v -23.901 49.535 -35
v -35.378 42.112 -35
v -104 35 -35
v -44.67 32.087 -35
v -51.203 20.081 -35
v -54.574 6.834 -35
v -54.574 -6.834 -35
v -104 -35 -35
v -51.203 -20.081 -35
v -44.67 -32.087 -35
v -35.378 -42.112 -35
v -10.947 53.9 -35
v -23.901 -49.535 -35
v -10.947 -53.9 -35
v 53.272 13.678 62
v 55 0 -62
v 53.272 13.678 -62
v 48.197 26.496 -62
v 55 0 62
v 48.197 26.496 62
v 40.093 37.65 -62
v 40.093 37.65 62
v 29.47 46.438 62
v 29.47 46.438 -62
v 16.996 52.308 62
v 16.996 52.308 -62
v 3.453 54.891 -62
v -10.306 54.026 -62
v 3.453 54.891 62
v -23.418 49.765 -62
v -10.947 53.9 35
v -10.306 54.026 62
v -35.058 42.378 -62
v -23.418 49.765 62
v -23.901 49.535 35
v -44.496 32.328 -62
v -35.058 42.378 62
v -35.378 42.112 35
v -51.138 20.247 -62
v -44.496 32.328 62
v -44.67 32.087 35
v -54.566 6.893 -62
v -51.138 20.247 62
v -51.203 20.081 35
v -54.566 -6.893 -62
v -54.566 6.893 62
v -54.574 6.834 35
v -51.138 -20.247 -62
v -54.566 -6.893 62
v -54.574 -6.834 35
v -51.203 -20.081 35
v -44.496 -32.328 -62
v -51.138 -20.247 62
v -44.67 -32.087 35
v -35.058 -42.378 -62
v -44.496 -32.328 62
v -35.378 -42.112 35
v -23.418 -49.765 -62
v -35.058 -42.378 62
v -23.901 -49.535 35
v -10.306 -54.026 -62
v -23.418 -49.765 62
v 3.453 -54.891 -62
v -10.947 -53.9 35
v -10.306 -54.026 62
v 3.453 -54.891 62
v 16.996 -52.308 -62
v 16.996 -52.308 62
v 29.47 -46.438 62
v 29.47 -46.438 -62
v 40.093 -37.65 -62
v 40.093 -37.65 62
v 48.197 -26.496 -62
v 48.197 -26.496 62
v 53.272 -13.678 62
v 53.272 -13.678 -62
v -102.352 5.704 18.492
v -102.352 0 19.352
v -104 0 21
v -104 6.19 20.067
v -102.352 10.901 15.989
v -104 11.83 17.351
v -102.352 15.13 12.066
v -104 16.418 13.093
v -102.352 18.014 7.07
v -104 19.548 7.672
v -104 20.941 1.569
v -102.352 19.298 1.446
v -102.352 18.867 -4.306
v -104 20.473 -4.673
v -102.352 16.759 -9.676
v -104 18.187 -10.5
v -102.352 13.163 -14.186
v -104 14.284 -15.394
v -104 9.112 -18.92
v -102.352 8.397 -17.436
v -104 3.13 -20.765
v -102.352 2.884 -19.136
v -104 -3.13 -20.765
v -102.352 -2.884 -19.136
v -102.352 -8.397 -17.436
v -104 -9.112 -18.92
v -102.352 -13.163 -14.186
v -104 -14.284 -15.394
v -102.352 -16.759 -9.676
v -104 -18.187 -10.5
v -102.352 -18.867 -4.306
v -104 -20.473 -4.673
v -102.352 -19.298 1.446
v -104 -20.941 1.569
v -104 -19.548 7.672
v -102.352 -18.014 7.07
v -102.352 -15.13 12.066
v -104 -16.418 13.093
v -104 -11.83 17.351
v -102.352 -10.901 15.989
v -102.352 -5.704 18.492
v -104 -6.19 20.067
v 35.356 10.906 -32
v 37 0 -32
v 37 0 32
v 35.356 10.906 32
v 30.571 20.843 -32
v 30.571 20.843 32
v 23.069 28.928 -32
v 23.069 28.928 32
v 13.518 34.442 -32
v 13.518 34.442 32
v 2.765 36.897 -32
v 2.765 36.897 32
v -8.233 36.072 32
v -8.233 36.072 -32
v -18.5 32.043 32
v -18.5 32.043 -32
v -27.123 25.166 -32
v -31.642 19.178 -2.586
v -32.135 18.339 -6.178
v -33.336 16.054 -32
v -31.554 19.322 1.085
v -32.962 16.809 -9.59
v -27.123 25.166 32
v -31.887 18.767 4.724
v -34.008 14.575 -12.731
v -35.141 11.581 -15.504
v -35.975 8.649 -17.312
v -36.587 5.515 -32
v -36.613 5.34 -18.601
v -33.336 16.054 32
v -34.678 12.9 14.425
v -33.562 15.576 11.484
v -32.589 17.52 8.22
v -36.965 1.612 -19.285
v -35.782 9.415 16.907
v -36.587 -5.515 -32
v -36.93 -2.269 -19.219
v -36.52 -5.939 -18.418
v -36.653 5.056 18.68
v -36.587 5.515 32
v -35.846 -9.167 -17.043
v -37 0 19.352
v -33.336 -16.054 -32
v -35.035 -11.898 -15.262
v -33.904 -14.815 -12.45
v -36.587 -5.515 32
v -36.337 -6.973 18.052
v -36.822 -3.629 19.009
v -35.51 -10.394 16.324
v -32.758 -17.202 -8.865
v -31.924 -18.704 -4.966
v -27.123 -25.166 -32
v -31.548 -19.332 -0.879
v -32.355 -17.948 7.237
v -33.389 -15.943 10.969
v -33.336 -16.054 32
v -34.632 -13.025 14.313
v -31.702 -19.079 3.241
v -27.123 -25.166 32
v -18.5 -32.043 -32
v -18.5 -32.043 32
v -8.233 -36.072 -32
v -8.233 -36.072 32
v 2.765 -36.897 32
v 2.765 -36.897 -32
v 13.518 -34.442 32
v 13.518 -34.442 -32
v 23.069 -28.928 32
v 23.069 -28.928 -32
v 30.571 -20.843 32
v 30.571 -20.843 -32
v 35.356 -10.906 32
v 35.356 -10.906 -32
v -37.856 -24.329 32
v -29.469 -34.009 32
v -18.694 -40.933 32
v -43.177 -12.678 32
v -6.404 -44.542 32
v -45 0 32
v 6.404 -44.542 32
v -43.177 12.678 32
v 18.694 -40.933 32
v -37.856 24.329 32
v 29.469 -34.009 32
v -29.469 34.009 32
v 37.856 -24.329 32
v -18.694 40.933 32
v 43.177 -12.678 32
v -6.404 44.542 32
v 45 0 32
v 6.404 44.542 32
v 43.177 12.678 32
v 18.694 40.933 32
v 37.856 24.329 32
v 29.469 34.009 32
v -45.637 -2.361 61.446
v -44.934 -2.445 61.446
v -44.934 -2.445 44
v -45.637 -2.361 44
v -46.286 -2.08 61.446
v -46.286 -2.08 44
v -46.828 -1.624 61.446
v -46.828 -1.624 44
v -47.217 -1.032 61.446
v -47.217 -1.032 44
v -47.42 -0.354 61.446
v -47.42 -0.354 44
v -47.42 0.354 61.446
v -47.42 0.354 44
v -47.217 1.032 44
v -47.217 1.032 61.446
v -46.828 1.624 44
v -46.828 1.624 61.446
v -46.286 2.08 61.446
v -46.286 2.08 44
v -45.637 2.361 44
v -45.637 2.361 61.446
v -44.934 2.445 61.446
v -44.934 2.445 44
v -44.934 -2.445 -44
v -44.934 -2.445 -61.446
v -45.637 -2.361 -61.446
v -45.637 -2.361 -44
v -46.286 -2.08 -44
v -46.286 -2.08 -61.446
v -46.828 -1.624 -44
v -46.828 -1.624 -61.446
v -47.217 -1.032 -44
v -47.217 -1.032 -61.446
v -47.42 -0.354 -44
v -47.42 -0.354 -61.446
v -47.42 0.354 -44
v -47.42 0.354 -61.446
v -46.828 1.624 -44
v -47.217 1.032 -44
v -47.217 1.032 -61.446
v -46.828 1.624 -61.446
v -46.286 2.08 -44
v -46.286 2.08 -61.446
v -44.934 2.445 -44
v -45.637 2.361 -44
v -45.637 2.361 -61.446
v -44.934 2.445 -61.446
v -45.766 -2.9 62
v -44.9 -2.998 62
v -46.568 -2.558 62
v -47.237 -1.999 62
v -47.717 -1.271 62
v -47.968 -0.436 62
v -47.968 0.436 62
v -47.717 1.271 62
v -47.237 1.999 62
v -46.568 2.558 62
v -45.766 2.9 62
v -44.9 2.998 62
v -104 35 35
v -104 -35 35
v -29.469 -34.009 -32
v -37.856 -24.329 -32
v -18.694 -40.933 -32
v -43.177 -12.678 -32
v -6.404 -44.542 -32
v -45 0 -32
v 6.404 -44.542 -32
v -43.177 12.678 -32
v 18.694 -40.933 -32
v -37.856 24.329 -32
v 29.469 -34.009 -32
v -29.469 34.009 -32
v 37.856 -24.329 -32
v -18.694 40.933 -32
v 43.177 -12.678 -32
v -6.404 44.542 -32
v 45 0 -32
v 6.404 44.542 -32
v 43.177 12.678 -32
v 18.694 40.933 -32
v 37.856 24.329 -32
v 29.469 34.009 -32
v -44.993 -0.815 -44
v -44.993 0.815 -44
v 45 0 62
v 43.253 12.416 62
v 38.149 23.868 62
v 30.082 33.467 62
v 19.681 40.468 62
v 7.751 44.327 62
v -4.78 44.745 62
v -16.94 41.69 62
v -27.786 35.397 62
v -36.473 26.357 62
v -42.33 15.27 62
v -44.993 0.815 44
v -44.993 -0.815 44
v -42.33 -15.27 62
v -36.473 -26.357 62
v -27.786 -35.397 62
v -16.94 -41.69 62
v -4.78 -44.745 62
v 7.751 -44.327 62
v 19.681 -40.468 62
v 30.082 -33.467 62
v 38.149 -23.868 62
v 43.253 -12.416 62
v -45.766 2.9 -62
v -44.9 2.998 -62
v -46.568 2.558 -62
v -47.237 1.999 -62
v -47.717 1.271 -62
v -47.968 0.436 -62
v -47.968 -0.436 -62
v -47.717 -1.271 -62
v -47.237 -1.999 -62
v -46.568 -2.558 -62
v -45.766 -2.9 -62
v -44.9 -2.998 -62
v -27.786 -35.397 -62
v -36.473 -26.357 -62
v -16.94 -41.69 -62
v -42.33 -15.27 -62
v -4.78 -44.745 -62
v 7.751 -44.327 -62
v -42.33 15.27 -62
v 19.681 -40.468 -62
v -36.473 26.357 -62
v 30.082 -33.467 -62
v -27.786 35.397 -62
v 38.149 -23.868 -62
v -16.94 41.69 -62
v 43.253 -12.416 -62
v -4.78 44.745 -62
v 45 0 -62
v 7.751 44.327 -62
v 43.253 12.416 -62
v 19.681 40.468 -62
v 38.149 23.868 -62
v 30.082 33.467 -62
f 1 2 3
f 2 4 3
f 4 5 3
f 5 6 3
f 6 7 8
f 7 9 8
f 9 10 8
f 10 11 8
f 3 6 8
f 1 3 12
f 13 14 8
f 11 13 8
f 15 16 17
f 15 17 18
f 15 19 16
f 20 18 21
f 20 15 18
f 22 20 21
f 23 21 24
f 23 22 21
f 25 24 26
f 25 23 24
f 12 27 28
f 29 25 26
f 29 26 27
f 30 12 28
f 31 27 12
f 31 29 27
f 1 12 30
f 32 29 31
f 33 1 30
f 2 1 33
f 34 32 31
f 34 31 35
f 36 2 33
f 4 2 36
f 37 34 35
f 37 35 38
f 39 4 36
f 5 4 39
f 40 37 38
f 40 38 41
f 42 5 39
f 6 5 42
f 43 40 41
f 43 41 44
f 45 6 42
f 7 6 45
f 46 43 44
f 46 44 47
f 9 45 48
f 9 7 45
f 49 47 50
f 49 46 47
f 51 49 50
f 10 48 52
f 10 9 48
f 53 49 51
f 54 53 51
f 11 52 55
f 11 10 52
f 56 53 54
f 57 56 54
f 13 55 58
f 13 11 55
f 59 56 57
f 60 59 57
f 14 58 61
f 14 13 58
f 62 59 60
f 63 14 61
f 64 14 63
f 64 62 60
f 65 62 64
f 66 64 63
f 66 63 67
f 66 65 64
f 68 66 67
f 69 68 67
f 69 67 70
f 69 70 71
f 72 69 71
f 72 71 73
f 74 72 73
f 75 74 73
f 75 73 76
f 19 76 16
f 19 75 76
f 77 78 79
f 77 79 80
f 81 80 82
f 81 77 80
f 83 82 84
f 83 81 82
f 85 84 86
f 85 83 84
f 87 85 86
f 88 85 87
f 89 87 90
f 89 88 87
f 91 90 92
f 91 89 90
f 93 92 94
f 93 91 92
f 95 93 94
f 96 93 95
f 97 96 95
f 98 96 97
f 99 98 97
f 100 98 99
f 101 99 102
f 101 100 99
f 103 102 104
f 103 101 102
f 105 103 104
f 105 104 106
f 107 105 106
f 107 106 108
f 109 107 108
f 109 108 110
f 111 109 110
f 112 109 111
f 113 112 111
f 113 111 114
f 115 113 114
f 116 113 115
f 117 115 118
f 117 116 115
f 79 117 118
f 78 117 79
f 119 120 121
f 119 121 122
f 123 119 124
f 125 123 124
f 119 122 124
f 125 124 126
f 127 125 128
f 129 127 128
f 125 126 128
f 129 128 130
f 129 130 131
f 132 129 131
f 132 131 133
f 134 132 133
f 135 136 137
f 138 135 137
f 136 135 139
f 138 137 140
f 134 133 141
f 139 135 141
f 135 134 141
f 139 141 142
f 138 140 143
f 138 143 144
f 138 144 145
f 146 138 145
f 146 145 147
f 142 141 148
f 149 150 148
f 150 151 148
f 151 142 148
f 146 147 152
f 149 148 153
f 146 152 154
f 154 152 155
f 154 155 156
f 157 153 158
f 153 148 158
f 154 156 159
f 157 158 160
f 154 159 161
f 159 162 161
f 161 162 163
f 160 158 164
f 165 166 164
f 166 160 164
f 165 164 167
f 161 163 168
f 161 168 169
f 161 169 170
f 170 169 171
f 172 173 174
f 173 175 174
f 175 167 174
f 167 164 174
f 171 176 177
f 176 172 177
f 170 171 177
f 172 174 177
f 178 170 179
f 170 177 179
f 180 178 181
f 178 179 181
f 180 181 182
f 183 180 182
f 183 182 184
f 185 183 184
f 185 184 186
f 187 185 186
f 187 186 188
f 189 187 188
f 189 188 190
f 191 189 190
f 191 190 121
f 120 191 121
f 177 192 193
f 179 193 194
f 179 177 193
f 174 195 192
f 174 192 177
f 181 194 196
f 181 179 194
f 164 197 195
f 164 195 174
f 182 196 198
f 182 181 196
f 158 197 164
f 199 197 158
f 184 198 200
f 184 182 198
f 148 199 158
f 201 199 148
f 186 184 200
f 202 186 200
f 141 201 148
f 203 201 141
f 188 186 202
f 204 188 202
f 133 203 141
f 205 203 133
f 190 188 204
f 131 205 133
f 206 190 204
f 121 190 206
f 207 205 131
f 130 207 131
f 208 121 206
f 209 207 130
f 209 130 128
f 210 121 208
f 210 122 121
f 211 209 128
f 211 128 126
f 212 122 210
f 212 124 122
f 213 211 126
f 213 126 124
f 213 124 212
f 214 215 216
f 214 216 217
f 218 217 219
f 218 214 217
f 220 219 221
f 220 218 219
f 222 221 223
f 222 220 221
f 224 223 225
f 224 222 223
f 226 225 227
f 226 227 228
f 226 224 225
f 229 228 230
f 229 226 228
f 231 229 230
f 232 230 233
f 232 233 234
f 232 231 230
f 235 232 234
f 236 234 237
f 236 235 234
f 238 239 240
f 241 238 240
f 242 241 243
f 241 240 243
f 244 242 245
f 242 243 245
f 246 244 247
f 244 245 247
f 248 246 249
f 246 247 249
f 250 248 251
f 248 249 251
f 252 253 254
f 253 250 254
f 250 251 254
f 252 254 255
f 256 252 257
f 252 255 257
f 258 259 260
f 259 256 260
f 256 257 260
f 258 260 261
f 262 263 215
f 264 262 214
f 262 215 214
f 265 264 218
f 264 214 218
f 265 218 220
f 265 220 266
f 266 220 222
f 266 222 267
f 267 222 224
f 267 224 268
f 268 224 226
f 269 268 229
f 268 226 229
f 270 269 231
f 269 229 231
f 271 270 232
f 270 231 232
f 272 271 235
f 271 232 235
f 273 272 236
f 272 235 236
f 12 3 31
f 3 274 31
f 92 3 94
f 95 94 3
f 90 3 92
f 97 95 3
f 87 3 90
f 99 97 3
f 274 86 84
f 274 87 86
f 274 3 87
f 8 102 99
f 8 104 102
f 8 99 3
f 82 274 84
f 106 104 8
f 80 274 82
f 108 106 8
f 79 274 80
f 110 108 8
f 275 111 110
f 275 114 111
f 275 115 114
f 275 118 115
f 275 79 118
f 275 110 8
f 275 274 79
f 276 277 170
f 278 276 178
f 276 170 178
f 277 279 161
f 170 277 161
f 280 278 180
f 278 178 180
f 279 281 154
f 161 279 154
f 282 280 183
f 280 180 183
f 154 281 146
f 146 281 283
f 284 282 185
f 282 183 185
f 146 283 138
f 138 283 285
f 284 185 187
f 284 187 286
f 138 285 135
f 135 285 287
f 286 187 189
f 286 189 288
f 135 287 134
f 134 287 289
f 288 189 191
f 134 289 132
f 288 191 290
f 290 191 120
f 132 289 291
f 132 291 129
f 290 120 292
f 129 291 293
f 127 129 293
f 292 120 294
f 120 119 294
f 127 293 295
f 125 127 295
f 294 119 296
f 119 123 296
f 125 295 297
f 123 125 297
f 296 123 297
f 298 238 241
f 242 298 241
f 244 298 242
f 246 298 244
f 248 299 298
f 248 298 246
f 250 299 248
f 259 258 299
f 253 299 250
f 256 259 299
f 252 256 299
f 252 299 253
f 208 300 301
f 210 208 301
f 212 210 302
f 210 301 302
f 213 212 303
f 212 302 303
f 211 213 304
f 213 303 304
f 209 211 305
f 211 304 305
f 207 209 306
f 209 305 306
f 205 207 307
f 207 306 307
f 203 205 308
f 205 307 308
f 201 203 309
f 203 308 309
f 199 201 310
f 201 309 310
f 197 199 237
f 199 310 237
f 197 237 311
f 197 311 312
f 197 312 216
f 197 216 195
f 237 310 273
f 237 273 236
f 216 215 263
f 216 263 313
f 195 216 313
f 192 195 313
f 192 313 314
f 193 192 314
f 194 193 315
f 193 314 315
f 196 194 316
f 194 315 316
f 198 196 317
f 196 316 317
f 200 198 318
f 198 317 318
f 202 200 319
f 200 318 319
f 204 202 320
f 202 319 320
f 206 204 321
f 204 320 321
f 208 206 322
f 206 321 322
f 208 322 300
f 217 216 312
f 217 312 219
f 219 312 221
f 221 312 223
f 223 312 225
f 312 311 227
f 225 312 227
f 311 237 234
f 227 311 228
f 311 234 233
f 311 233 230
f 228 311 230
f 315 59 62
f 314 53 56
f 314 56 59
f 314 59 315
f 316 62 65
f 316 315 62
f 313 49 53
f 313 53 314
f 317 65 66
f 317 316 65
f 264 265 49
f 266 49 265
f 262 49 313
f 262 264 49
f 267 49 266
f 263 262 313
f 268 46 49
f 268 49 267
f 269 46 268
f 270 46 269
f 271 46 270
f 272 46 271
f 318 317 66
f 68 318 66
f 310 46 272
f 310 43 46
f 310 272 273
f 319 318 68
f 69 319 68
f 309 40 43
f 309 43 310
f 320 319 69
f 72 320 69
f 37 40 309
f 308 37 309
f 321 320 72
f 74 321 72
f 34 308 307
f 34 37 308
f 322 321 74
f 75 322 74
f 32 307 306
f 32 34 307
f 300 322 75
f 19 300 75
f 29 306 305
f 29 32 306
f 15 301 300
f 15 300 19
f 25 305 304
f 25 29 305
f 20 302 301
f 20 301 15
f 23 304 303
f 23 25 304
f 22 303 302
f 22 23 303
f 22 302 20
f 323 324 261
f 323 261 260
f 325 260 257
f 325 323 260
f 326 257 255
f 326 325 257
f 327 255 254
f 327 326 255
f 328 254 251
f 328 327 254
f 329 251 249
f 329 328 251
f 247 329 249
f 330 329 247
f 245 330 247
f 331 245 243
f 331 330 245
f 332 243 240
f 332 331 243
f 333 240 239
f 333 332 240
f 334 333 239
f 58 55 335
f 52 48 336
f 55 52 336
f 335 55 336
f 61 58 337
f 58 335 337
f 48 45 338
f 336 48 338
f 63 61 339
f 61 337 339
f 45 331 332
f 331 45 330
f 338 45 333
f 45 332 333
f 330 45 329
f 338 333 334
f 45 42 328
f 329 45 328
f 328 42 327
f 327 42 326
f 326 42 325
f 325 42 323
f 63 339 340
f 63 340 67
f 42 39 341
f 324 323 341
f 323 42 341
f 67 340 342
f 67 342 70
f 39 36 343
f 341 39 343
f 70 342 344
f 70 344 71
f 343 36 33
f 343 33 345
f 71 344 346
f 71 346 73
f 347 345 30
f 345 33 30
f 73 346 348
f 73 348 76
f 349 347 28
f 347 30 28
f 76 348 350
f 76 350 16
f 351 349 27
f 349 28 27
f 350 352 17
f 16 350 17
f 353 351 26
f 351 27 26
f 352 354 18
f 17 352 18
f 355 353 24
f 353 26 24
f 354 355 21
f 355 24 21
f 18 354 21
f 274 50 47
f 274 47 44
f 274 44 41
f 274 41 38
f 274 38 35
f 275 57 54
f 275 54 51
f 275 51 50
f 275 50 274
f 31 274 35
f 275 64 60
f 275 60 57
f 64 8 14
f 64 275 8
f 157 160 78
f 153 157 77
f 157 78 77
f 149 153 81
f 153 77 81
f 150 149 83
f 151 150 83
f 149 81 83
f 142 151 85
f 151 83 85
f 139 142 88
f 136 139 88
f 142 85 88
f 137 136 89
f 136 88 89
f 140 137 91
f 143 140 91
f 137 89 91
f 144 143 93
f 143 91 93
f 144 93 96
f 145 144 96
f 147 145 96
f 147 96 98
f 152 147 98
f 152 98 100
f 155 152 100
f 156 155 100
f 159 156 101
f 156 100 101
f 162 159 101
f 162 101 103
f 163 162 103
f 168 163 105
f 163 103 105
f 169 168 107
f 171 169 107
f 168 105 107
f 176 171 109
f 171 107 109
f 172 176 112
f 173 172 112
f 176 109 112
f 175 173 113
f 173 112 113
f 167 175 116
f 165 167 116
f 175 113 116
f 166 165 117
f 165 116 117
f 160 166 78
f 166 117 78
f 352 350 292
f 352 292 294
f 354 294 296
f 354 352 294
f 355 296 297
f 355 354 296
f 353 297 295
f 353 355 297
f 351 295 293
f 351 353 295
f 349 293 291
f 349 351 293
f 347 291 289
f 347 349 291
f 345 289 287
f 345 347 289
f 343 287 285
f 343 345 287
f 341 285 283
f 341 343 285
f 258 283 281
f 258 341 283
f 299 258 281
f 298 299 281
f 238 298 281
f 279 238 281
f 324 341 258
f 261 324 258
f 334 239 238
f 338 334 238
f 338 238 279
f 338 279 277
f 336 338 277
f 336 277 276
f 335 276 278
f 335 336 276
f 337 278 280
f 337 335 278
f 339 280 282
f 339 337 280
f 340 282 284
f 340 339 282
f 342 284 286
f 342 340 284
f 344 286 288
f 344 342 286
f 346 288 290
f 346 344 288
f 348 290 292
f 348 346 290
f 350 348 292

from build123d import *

# Parameters (mm, degrees)
SKETCH_1_R               = 55
EXTRUDE_1_DEPTH          = 62
EXTRUDE_2_DEPTH          = 35
SKETCH_3_R               = 37
CUT_EXTRUDE_1_DEPTH      = 63
CUT_EXTRUDE_1_DEPTH_BACK = 63
SKETCH_4_R               = 45
CUT_EXTRUDE_2_DEPTH      = 30
CUT_EXTRUDE_3_REACH      = 161
SKETCH_6_R               = 19.352
CHAMFER_2_SIZE           = 1.648
SKETCH_9_R               = 2.4455
CUT_EXTRUDE_5_DEPTH      = 18
CHAMFER_3_SIZE           = 0.5545


with BuildPart() as part:
    # Эскиз1 → Бобышка-Вытянуть1 (new body, symmetric)
    with BuildSketch(Plane.XY):
        Circle(SKETCH_1_R)
    extrude(amount=EXTRUDE_1_DEPTH, both=True)

    # Эскиз2 → Бобышка-Вытянуть2 (add, symmetric)
    with BuildSketch(Plane.XY):
        Polygon((-104, 0), (-104, 35), (-10.947280704, 53.899508766), (-10.947280704, 0), align=None)
    extrude_2 = extrude(amount=EXTRUDE_2_DEPTH, both=True)

    # Зеркальное отражение1: Бобышка-Вытянуть2 across plane
    add(extrude_2.mirror(Plane(origin=(-104, 0, 35), x_dir=(0, 0, 1), z_dir=(0, 1, 0))))

    # Эскиз3 → Вырез-Вытянуть1 (cut, two sides)
    with BuildSketch(Plane.XY) as cut_extrude_1_sk:
        Circle(SKETCH_3_R)
    extrude(amount=CUT_EXTRUDE_1_DEPTH, mode=Mode.SUBTRACT)
    extrude(cut_extrude_1_sk.sketch, amount=-CUT_EXTRUDE_1_DEPTH_BACK, mode=Mode.SUBTRACT)

    # Эскиз4 → Вырез-Вытянуть2 (cut)
    with BuildSketch(Plane.XY.offset(62)):
        Circle(SKETCH_4_R)
    cut_extrude_2 = extrude(amount=-CUT_EXTRUDE_2_DEPTH, mode=Mode.SUBTRACT)

    # Зеркальное отражение2: Вырез-Вытянуть2 across plane
    add(cut_extrude_2.mirror(Plane.XY), mode=Mode.SUBTRACT)

    # Эскиз6 → Вырез-Вытянуть3 (cut, up to next)
    with BuildSketch(Plane.ZY.offset(104), mode=Mode.PRIVATE) as cut_extrude_3_sk1:
        Circle(SKETCH_6_R)
    cut_extrude_3_tool1 = extrude(cut_extrude_3_sk1.sketch, amount=-CUT_EXTRUDE_3_REACH, mode=Mode.PRIVATE) & part.part
    add(cut_extrude_3_tool1.solids().sort_by_distance((-104, 0, 0))[0], mode=Mode.SUBTRACT)

    # Фаска2
    chamfer_2_edges = [part.edges().sort_by_distance(p)[0] for p in [
        (-104, 0, -19.352),
    ]]
    chamfer(chamfer_2_edges, length=CHAMFER_2_SIZE)

    # Эскиз9 → Вырез-Вытянуть5 (cut)
    with BuildSketch(Plane(origin=(0, 0, -62), x_dir=(-1, 0, 0), z_dir=(0, 0, -1))):
        with Locations((45, 0)):
            Circle(SKETCH_9_R)
    cut_extrude_5 = extrude(amount=-CUT_EXTRUDE_5_DEPTH, mode=Mode.SUBTRACT)

    # Зеркальное отражение3: Вырез-Вытянуть5 across plane
    add(cut_extrude_5.mirror(Plane.XY), mode=Mode.SUBTRACT)

    # Фаска3
    chamfer_3_edges = [part.edges().sort_by_distance(p)[0] for p in [
        (-47.4455, 0, -62),
        (-47.4455, 0, 62),
    ]]
    chamfer(chamfer_3_edges, length=CHAMFER_3_SIZE)


solid = part.part
